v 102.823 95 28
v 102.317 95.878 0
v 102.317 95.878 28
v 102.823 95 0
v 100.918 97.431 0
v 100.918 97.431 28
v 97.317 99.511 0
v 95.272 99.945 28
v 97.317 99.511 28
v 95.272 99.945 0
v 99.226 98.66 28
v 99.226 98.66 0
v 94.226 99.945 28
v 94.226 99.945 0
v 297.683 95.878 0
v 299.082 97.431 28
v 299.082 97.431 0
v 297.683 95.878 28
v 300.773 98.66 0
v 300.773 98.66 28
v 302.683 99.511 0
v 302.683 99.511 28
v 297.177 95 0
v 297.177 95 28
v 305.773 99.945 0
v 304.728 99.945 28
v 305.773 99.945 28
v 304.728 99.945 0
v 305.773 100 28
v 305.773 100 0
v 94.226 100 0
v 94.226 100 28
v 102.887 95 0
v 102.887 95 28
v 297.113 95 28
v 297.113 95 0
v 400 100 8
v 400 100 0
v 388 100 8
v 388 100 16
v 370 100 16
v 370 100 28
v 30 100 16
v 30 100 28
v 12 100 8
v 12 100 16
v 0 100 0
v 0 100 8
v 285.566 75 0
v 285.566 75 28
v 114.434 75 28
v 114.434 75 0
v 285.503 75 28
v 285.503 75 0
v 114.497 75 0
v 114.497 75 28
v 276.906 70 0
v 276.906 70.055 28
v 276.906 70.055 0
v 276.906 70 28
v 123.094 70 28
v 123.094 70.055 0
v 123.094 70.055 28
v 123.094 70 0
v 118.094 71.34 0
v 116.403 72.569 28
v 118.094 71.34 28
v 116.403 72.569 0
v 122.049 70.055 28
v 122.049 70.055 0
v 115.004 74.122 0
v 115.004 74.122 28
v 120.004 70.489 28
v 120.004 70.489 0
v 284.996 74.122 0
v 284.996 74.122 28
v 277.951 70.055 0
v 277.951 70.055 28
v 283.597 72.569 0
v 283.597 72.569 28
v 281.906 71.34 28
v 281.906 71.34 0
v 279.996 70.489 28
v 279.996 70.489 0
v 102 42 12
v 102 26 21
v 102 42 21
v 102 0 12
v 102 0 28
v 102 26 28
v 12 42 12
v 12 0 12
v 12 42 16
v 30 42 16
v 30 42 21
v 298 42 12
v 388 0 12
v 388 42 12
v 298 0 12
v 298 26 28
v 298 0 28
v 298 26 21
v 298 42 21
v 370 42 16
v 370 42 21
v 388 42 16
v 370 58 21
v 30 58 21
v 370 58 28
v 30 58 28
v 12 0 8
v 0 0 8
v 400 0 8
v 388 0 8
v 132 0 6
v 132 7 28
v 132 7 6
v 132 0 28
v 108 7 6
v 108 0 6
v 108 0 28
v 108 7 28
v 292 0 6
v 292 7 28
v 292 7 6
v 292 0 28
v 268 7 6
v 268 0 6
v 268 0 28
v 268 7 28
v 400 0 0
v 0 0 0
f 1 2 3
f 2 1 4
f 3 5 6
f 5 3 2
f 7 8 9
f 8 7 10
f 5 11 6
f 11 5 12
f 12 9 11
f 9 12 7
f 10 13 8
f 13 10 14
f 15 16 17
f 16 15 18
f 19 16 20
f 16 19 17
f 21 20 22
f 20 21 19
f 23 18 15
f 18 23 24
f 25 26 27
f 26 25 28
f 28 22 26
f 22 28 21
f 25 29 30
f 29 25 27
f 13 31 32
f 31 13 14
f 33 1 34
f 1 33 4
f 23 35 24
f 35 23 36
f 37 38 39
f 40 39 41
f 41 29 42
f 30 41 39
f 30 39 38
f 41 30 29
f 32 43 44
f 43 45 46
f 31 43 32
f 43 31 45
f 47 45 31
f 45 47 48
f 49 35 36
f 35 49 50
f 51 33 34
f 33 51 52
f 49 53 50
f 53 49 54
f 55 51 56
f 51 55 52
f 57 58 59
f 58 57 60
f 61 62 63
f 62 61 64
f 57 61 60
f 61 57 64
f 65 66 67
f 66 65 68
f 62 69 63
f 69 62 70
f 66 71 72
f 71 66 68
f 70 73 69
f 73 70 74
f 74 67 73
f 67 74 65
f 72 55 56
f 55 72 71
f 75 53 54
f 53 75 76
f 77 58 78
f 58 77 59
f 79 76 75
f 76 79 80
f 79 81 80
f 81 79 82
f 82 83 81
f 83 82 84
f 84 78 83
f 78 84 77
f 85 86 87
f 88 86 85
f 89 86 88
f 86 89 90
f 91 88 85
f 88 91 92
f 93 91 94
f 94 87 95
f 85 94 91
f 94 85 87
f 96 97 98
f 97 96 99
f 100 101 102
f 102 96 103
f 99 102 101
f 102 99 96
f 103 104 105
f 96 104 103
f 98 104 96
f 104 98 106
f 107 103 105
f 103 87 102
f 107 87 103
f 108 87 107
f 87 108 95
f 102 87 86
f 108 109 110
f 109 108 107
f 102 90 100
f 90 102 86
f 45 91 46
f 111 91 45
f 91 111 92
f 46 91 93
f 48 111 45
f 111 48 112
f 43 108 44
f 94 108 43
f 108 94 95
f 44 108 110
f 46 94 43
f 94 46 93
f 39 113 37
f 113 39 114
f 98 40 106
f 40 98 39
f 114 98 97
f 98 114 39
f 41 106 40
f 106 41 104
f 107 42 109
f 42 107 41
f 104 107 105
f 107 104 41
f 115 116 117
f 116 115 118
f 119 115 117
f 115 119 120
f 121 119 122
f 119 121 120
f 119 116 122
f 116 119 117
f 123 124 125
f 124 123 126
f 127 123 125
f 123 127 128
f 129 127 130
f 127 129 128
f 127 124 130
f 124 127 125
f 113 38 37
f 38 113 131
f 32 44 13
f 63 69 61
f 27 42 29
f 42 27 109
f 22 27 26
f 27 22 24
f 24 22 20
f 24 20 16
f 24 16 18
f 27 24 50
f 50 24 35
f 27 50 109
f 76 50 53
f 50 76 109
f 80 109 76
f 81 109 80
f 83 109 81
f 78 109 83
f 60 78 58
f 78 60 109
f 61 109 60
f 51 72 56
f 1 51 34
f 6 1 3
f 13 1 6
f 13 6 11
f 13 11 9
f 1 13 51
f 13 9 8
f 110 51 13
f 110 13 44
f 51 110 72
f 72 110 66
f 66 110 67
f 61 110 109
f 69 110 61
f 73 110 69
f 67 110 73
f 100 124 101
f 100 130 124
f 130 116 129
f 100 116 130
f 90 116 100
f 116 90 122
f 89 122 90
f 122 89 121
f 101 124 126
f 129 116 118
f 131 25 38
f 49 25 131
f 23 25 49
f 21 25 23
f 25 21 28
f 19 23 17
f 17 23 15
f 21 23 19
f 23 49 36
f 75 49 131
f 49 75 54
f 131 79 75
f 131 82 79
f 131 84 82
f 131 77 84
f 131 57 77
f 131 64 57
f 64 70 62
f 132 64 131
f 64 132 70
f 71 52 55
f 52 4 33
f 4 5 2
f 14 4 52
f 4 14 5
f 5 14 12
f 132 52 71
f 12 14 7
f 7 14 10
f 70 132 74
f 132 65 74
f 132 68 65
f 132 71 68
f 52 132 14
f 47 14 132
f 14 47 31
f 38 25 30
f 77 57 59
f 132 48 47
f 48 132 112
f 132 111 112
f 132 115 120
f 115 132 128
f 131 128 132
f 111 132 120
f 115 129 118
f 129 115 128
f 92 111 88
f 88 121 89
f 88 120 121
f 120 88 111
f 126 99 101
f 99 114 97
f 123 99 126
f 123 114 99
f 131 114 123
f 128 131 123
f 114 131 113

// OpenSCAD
include <../src/wardrobe.scad>;
plank_xz_front_bottom(wardrobe_n);
//github_openscad -o wardrobe_2/plank_xz_front_bottom.stl -D wardrobe_n=2 -D cutting_edge=0 -D break_view_length=0 wardrobe_2/plank_xz_front_bottom_stl.scad
